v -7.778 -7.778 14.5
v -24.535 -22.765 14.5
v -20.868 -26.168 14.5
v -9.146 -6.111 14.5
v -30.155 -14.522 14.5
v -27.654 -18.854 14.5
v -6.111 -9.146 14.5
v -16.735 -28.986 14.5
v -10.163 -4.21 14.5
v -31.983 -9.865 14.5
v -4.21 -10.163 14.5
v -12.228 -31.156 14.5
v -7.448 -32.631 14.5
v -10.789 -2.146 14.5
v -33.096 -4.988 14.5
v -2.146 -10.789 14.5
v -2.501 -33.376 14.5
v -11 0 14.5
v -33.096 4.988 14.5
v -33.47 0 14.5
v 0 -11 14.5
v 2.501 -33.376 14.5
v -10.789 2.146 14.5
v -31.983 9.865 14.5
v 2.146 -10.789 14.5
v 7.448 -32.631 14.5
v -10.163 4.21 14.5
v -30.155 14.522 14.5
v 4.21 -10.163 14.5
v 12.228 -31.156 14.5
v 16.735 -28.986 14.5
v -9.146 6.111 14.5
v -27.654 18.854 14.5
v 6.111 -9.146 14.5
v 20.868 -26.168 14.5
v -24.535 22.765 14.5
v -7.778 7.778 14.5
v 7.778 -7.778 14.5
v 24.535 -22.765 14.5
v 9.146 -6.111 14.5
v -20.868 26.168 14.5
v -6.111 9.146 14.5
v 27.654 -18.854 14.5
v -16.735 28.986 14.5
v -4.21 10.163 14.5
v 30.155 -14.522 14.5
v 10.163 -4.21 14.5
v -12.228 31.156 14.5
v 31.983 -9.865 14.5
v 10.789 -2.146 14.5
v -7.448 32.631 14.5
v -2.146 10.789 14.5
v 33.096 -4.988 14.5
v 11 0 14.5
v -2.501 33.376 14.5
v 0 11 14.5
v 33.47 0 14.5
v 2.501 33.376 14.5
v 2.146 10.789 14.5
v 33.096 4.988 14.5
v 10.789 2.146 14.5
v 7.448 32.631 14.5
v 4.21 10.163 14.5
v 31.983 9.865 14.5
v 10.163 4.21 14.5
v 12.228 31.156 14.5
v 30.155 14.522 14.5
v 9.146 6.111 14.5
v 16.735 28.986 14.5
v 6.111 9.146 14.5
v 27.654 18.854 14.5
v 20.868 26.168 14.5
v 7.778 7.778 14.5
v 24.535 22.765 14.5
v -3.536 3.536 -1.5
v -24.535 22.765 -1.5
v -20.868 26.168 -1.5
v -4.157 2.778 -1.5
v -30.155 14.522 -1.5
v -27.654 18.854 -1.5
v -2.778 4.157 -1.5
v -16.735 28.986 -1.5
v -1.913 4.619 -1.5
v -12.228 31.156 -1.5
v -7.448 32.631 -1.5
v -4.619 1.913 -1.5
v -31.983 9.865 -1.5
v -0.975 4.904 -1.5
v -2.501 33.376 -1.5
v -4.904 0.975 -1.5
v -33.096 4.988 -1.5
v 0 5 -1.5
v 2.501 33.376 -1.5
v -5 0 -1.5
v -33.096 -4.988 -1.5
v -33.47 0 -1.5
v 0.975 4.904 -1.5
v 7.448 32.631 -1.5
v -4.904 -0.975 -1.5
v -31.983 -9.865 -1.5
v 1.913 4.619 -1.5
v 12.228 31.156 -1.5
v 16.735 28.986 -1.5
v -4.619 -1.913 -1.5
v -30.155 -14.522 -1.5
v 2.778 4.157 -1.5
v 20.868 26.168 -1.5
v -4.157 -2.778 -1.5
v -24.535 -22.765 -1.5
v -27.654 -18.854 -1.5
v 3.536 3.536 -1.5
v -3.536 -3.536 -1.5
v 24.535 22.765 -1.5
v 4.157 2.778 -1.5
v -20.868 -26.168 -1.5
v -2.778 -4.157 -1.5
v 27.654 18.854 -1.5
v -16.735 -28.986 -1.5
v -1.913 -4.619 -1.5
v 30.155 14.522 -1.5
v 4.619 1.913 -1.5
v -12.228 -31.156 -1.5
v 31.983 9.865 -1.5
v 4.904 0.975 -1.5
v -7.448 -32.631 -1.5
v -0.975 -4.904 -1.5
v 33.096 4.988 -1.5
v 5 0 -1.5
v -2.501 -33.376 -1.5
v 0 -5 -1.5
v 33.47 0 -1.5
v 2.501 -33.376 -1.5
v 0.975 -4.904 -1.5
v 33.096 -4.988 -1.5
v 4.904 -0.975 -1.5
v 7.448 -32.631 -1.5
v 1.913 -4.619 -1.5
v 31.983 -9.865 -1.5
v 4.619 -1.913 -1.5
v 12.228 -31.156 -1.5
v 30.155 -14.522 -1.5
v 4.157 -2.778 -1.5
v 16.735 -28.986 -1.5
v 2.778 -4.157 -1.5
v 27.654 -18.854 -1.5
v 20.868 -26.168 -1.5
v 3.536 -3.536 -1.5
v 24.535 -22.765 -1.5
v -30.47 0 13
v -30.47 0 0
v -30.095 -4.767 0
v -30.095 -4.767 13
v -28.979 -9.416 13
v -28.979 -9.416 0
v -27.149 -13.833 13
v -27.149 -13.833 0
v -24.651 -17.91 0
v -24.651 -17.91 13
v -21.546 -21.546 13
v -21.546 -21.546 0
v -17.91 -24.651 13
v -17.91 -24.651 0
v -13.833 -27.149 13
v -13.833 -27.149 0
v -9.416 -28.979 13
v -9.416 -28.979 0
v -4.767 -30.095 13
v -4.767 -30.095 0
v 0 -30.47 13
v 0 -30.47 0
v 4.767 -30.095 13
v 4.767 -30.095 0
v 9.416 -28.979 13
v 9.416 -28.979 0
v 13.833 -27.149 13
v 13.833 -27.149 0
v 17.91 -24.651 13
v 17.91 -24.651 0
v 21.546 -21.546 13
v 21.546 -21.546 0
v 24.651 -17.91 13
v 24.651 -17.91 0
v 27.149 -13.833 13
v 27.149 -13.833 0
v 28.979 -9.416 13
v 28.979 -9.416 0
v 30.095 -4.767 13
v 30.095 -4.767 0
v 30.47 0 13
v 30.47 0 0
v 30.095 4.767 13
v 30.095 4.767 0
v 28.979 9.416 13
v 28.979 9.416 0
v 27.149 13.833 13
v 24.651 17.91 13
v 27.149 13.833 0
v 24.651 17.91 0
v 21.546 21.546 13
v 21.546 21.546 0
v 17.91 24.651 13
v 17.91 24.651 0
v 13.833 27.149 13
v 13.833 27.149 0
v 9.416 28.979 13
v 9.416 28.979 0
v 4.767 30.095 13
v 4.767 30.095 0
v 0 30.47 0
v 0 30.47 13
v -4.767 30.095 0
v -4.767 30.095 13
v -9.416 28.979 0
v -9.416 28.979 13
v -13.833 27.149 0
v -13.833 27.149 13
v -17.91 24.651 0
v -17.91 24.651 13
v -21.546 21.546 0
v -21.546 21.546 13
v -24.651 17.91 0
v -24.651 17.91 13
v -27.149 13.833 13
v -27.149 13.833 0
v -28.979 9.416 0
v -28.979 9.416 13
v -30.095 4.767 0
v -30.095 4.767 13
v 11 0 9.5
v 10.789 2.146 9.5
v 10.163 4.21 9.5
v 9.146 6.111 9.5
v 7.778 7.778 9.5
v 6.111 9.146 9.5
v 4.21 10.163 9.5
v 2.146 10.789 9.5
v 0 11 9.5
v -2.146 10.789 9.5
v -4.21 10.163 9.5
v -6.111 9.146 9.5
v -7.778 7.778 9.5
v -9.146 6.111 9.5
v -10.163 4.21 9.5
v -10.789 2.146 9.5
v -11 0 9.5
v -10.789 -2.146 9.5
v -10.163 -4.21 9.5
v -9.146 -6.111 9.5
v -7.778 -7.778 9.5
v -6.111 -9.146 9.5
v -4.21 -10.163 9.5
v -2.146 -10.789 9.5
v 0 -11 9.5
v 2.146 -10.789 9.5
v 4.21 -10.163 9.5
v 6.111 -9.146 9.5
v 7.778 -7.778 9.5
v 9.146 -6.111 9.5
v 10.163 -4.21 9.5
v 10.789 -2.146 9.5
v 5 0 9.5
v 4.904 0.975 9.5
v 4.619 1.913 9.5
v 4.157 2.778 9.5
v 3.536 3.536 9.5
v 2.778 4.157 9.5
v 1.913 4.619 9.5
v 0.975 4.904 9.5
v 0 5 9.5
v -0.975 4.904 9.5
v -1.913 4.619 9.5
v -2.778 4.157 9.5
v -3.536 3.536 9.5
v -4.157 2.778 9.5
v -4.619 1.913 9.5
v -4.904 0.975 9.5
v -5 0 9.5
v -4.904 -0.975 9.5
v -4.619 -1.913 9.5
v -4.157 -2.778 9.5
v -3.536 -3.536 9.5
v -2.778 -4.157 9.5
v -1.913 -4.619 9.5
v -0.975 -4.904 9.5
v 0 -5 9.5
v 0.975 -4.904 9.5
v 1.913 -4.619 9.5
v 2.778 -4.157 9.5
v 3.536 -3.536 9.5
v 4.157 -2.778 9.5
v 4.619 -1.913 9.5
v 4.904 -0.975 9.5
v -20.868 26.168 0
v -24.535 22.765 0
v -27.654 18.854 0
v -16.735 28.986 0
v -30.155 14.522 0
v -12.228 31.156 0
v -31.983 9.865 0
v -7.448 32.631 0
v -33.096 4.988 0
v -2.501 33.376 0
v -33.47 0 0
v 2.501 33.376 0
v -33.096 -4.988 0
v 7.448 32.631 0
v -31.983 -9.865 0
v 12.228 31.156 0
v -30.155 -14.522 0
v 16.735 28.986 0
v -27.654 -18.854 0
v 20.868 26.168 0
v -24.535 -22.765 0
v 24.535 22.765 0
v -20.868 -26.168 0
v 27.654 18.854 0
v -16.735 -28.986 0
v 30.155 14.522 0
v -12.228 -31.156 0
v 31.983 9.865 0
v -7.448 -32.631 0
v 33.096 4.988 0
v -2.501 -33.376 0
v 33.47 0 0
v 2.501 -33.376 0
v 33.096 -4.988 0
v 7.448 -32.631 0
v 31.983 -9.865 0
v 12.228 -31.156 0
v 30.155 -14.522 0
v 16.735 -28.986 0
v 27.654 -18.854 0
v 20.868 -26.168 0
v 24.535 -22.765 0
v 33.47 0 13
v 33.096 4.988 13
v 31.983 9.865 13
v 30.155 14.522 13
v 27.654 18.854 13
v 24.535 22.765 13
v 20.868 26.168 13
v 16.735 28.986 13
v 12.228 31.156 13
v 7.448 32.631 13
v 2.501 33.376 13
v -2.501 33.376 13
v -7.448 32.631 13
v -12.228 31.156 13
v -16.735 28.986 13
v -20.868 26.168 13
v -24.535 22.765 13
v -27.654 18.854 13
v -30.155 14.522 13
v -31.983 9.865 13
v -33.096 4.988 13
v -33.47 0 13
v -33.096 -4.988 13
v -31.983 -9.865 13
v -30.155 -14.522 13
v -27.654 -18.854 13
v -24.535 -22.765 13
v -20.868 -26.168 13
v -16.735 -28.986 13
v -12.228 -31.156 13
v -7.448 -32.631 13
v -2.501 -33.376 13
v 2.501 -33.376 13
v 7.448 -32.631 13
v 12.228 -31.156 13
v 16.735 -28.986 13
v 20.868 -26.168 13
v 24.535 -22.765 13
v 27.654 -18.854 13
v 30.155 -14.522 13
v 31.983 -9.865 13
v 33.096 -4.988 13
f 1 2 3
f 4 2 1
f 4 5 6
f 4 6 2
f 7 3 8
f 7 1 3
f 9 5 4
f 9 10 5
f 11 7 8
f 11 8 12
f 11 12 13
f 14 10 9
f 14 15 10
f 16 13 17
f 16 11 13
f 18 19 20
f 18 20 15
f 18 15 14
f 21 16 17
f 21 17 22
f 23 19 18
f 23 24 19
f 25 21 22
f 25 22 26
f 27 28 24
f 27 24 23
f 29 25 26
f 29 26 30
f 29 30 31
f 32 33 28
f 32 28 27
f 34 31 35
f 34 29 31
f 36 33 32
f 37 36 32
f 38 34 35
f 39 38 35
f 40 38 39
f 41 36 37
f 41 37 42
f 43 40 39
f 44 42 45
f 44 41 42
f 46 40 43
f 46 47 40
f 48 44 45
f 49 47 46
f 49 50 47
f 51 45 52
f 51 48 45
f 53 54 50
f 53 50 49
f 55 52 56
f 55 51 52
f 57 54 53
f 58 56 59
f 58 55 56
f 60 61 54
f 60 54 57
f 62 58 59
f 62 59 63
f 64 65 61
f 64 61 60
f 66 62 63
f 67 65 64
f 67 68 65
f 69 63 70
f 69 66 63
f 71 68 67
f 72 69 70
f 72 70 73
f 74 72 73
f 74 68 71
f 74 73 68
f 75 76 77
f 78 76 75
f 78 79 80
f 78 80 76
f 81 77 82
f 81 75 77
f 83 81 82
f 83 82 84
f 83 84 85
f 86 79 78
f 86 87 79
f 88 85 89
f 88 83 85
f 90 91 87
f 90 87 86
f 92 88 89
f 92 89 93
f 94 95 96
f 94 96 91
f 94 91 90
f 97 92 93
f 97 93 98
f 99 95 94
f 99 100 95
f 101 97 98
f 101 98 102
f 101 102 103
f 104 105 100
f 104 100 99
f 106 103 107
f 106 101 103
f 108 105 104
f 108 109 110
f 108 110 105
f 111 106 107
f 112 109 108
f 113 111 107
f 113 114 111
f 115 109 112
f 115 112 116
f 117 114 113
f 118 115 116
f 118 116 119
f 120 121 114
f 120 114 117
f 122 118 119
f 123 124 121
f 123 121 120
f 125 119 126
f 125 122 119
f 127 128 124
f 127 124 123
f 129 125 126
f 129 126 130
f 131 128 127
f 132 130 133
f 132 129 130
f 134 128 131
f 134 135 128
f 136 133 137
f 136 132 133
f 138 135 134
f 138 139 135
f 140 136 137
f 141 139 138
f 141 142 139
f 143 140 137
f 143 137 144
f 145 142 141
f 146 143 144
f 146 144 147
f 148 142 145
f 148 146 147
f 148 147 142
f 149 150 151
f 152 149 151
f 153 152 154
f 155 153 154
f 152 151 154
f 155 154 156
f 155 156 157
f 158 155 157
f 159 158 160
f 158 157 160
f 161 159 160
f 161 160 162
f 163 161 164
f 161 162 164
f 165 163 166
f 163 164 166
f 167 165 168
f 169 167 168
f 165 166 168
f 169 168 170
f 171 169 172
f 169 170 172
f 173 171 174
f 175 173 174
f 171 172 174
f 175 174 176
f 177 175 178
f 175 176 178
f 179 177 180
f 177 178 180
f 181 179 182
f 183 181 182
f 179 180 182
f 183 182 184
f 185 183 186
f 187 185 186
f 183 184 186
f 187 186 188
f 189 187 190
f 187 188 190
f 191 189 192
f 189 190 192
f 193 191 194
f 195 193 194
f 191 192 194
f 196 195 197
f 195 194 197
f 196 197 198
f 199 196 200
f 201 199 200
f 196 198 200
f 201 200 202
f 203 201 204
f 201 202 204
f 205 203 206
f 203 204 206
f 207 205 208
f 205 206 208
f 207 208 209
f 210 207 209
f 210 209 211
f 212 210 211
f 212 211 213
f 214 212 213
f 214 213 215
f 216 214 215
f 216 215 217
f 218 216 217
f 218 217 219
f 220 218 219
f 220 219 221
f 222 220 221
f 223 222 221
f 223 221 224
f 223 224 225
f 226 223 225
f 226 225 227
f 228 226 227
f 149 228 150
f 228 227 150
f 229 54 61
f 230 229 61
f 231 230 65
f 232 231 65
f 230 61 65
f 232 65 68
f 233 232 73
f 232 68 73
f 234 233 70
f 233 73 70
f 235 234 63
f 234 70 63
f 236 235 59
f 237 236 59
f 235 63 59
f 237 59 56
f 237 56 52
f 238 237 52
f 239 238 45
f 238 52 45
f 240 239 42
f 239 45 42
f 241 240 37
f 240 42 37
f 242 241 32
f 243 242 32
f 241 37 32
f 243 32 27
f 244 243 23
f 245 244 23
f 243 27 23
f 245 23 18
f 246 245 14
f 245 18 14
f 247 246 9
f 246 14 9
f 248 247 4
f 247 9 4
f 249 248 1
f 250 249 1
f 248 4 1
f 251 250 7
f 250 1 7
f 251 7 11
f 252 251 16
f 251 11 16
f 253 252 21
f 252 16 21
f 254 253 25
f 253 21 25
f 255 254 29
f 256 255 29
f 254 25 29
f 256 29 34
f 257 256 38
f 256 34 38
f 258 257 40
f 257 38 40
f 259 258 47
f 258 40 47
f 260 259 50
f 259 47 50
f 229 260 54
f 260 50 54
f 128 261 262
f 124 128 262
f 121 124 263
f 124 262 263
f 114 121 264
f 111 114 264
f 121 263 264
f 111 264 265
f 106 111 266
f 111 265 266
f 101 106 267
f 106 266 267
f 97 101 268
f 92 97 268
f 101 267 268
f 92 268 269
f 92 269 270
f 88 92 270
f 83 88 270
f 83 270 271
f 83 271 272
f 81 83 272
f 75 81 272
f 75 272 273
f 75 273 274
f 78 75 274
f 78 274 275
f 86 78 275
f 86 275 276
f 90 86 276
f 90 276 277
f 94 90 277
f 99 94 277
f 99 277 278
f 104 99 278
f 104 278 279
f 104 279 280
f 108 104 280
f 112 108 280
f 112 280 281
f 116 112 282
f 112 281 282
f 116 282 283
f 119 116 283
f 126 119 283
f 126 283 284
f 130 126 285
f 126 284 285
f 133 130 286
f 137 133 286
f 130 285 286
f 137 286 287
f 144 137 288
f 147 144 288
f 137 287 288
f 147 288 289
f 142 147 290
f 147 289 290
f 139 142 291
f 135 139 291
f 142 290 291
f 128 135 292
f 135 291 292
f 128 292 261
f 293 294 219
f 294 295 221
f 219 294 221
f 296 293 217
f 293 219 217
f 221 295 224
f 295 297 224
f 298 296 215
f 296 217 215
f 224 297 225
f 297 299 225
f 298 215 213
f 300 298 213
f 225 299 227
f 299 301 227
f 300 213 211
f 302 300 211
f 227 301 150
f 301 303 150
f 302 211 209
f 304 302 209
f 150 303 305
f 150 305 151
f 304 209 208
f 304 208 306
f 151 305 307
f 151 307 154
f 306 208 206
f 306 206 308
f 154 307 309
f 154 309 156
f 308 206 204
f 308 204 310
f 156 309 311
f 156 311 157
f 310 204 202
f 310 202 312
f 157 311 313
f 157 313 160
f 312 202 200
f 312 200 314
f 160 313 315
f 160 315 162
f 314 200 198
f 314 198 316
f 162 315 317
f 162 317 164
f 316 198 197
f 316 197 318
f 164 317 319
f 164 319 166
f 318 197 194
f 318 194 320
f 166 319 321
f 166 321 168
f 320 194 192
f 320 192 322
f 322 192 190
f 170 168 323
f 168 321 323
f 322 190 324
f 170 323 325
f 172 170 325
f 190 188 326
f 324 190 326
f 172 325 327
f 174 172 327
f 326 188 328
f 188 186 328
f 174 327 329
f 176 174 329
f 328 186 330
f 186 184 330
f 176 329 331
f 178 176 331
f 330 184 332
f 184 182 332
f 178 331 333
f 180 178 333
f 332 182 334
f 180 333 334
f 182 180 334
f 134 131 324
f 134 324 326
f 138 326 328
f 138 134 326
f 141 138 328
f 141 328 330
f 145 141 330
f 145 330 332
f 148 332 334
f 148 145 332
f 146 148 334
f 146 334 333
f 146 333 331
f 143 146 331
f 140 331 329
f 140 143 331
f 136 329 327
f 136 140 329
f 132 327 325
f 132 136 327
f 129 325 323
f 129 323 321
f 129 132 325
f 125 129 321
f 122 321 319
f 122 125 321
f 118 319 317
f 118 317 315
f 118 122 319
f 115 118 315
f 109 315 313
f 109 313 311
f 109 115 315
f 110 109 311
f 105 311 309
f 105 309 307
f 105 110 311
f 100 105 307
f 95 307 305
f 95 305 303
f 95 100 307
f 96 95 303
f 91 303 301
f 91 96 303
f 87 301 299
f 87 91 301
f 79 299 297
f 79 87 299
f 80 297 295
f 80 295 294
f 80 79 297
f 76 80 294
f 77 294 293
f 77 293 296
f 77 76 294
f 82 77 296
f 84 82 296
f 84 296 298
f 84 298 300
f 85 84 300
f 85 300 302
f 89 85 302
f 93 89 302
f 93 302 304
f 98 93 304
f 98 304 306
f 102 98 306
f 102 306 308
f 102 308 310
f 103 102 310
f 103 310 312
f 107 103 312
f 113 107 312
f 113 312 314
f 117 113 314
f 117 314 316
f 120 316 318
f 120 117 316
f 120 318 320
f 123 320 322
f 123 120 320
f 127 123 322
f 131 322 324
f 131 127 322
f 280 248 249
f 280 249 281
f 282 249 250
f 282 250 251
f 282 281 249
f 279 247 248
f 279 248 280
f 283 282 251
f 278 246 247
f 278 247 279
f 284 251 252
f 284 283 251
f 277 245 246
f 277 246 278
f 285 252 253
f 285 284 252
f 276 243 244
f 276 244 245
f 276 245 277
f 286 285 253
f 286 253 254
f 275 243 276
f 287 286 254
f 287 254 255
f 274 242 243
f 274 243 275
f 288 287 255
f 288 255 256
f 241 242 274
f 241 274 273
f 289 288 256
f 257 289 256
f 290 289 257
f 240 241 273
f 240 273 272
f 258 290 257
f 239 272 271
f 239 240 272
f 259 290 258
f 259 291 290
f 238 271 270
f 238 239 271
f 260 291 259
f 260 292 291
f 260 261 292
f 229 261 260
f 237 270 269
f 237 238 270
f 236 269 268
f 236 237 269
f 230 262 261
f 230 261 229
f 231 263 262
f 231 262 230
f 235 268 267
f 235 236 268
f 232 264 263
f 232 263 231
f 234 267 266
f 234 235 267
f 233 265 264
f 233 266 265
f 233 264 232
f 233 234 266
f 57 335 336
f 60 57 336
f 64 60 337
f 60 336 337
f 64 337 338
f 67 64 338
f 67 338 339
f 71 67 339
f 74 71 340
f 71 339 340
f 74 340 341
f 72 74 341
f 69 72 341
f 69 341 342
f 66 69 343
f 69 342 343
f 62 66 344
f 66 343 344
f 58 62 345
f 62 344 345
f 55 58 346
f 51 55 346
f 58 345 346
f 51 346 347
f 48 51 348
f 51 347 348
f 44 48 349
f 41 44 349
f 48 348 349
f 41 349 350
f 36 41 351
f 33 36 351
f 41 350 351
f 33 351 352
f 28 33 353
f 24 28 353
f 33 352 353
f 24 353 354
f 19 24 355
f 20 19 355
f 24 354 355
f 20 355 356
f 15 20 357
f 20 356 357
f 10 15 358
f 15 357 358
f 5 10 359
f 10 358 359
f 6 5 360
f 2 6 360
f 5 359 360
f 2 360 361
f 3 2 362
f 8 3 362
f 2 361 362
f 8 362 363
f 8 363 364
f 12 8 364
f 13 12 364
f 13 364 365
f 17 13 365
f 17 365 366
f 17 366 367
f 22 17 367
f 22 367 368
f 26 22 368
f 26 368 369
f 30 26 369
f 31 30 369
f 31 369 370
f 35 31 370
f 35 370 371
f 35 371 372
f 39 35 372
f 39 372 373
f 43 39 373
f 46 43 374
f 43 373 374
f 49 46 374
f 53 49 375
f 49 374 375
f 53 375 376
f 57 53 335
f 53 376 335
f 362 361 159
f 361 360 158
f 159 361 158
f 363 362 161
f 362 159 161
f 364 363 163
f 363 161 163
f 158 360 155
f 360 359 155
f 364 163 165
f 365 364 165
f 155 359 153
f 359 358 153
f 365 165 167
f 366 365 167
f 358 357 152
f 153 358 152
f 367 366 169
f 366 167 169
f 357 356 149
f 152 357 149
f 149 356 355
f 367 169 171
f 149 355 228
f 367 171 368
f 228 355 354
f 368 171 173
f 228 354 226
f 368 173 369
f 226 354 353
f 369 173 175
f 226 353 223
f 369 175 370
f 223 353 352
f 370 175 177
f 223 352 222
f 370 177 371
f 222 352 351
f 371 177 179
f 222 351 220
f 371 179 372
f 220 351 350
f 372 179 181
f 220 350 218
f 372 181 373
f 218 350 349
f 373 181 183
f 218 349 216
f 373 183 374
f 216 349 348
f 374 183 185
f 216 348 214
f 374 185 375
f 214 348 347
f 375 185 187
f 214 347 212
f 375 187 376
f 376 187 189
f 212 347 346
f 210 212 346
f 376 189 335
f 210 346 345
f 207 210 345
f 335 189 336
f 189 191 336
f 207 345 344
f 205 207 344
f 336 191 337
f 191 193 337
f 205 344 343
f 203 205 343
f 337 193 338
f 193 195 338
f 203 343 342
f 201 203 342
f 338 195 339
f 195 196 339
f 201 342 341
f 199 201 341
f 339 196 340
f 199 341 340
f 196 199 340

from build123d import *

# Parameters (mm, degrees)
SKETCH_1_R          = 30.47
EXTRUDE_1_DEPTH     = 13
SKETCH_2_R          = 33.47
EXTRUDE_2_DEPTH     = 1.5
EXTRUDE_START       = 1.5
SKETCH_3_R          = 33.47
EXTRUDE_3_DEPTH     = 1.5
SKETCH_4_R          = 5
CUT_EXTRUDE_1_DEPTH = 50.964805614
SKETCH_5_R          = 11
CUT_EXTRUDE_2_DEPTH = 5


with BuildPart() as part:
    # 草图1 → 凸台-拉伸1 (new body)
    with BuildSketch(Plane.XY):
        with Locations(Location((0, 0, 0), (0, 0, 180))):
            Circle(SKETCH_1_R)
    extrude(amount=EXTRUDE_1_DEPTH)

    # 草图2 → 凸台-拉伸2 (add)
    with BuildSketch(Plane.XY.offset(13)):
        Circle(SKETCH_2_R)
    extrude(amount=EXTRUDE_2_DEPTH)

    # 草图3 → 凸台-拉伸3 (add)
    with BuildSketch(Plane(origin=(0, 0, 0), x_dir=(-1, 0, 0), z_dir=(0, 0, -1)).offset(EXTRUDE_START)):
        with Locations(Location((0, 0, 0), (0, 0, 180))):
            Circle(SKETCH_3_R)
    extrude(amount=-EXTRUDE_3_DEPTH)

    # 草图4 → 切除-拉伸1 (cut, through all)
    with BuildSketch(Plane.XY.offset(14.5)):
        Circle(SKETCH_4_R)
    extrude(amount=-CUT_EXTRUDE_1_DEPTH, mode=Mode.SUBTRACT)

    # 草图5 → 切除-拉伸2 (cut)
    with BuildSketch(Plane.XY.offset(14.5)):
        Circle(SKETCH_5_R)
    extrude(amount=-CUT_EXTRUDE_2_DEPTH, mode=Mode.SUBTRACT)


solid = part.part
